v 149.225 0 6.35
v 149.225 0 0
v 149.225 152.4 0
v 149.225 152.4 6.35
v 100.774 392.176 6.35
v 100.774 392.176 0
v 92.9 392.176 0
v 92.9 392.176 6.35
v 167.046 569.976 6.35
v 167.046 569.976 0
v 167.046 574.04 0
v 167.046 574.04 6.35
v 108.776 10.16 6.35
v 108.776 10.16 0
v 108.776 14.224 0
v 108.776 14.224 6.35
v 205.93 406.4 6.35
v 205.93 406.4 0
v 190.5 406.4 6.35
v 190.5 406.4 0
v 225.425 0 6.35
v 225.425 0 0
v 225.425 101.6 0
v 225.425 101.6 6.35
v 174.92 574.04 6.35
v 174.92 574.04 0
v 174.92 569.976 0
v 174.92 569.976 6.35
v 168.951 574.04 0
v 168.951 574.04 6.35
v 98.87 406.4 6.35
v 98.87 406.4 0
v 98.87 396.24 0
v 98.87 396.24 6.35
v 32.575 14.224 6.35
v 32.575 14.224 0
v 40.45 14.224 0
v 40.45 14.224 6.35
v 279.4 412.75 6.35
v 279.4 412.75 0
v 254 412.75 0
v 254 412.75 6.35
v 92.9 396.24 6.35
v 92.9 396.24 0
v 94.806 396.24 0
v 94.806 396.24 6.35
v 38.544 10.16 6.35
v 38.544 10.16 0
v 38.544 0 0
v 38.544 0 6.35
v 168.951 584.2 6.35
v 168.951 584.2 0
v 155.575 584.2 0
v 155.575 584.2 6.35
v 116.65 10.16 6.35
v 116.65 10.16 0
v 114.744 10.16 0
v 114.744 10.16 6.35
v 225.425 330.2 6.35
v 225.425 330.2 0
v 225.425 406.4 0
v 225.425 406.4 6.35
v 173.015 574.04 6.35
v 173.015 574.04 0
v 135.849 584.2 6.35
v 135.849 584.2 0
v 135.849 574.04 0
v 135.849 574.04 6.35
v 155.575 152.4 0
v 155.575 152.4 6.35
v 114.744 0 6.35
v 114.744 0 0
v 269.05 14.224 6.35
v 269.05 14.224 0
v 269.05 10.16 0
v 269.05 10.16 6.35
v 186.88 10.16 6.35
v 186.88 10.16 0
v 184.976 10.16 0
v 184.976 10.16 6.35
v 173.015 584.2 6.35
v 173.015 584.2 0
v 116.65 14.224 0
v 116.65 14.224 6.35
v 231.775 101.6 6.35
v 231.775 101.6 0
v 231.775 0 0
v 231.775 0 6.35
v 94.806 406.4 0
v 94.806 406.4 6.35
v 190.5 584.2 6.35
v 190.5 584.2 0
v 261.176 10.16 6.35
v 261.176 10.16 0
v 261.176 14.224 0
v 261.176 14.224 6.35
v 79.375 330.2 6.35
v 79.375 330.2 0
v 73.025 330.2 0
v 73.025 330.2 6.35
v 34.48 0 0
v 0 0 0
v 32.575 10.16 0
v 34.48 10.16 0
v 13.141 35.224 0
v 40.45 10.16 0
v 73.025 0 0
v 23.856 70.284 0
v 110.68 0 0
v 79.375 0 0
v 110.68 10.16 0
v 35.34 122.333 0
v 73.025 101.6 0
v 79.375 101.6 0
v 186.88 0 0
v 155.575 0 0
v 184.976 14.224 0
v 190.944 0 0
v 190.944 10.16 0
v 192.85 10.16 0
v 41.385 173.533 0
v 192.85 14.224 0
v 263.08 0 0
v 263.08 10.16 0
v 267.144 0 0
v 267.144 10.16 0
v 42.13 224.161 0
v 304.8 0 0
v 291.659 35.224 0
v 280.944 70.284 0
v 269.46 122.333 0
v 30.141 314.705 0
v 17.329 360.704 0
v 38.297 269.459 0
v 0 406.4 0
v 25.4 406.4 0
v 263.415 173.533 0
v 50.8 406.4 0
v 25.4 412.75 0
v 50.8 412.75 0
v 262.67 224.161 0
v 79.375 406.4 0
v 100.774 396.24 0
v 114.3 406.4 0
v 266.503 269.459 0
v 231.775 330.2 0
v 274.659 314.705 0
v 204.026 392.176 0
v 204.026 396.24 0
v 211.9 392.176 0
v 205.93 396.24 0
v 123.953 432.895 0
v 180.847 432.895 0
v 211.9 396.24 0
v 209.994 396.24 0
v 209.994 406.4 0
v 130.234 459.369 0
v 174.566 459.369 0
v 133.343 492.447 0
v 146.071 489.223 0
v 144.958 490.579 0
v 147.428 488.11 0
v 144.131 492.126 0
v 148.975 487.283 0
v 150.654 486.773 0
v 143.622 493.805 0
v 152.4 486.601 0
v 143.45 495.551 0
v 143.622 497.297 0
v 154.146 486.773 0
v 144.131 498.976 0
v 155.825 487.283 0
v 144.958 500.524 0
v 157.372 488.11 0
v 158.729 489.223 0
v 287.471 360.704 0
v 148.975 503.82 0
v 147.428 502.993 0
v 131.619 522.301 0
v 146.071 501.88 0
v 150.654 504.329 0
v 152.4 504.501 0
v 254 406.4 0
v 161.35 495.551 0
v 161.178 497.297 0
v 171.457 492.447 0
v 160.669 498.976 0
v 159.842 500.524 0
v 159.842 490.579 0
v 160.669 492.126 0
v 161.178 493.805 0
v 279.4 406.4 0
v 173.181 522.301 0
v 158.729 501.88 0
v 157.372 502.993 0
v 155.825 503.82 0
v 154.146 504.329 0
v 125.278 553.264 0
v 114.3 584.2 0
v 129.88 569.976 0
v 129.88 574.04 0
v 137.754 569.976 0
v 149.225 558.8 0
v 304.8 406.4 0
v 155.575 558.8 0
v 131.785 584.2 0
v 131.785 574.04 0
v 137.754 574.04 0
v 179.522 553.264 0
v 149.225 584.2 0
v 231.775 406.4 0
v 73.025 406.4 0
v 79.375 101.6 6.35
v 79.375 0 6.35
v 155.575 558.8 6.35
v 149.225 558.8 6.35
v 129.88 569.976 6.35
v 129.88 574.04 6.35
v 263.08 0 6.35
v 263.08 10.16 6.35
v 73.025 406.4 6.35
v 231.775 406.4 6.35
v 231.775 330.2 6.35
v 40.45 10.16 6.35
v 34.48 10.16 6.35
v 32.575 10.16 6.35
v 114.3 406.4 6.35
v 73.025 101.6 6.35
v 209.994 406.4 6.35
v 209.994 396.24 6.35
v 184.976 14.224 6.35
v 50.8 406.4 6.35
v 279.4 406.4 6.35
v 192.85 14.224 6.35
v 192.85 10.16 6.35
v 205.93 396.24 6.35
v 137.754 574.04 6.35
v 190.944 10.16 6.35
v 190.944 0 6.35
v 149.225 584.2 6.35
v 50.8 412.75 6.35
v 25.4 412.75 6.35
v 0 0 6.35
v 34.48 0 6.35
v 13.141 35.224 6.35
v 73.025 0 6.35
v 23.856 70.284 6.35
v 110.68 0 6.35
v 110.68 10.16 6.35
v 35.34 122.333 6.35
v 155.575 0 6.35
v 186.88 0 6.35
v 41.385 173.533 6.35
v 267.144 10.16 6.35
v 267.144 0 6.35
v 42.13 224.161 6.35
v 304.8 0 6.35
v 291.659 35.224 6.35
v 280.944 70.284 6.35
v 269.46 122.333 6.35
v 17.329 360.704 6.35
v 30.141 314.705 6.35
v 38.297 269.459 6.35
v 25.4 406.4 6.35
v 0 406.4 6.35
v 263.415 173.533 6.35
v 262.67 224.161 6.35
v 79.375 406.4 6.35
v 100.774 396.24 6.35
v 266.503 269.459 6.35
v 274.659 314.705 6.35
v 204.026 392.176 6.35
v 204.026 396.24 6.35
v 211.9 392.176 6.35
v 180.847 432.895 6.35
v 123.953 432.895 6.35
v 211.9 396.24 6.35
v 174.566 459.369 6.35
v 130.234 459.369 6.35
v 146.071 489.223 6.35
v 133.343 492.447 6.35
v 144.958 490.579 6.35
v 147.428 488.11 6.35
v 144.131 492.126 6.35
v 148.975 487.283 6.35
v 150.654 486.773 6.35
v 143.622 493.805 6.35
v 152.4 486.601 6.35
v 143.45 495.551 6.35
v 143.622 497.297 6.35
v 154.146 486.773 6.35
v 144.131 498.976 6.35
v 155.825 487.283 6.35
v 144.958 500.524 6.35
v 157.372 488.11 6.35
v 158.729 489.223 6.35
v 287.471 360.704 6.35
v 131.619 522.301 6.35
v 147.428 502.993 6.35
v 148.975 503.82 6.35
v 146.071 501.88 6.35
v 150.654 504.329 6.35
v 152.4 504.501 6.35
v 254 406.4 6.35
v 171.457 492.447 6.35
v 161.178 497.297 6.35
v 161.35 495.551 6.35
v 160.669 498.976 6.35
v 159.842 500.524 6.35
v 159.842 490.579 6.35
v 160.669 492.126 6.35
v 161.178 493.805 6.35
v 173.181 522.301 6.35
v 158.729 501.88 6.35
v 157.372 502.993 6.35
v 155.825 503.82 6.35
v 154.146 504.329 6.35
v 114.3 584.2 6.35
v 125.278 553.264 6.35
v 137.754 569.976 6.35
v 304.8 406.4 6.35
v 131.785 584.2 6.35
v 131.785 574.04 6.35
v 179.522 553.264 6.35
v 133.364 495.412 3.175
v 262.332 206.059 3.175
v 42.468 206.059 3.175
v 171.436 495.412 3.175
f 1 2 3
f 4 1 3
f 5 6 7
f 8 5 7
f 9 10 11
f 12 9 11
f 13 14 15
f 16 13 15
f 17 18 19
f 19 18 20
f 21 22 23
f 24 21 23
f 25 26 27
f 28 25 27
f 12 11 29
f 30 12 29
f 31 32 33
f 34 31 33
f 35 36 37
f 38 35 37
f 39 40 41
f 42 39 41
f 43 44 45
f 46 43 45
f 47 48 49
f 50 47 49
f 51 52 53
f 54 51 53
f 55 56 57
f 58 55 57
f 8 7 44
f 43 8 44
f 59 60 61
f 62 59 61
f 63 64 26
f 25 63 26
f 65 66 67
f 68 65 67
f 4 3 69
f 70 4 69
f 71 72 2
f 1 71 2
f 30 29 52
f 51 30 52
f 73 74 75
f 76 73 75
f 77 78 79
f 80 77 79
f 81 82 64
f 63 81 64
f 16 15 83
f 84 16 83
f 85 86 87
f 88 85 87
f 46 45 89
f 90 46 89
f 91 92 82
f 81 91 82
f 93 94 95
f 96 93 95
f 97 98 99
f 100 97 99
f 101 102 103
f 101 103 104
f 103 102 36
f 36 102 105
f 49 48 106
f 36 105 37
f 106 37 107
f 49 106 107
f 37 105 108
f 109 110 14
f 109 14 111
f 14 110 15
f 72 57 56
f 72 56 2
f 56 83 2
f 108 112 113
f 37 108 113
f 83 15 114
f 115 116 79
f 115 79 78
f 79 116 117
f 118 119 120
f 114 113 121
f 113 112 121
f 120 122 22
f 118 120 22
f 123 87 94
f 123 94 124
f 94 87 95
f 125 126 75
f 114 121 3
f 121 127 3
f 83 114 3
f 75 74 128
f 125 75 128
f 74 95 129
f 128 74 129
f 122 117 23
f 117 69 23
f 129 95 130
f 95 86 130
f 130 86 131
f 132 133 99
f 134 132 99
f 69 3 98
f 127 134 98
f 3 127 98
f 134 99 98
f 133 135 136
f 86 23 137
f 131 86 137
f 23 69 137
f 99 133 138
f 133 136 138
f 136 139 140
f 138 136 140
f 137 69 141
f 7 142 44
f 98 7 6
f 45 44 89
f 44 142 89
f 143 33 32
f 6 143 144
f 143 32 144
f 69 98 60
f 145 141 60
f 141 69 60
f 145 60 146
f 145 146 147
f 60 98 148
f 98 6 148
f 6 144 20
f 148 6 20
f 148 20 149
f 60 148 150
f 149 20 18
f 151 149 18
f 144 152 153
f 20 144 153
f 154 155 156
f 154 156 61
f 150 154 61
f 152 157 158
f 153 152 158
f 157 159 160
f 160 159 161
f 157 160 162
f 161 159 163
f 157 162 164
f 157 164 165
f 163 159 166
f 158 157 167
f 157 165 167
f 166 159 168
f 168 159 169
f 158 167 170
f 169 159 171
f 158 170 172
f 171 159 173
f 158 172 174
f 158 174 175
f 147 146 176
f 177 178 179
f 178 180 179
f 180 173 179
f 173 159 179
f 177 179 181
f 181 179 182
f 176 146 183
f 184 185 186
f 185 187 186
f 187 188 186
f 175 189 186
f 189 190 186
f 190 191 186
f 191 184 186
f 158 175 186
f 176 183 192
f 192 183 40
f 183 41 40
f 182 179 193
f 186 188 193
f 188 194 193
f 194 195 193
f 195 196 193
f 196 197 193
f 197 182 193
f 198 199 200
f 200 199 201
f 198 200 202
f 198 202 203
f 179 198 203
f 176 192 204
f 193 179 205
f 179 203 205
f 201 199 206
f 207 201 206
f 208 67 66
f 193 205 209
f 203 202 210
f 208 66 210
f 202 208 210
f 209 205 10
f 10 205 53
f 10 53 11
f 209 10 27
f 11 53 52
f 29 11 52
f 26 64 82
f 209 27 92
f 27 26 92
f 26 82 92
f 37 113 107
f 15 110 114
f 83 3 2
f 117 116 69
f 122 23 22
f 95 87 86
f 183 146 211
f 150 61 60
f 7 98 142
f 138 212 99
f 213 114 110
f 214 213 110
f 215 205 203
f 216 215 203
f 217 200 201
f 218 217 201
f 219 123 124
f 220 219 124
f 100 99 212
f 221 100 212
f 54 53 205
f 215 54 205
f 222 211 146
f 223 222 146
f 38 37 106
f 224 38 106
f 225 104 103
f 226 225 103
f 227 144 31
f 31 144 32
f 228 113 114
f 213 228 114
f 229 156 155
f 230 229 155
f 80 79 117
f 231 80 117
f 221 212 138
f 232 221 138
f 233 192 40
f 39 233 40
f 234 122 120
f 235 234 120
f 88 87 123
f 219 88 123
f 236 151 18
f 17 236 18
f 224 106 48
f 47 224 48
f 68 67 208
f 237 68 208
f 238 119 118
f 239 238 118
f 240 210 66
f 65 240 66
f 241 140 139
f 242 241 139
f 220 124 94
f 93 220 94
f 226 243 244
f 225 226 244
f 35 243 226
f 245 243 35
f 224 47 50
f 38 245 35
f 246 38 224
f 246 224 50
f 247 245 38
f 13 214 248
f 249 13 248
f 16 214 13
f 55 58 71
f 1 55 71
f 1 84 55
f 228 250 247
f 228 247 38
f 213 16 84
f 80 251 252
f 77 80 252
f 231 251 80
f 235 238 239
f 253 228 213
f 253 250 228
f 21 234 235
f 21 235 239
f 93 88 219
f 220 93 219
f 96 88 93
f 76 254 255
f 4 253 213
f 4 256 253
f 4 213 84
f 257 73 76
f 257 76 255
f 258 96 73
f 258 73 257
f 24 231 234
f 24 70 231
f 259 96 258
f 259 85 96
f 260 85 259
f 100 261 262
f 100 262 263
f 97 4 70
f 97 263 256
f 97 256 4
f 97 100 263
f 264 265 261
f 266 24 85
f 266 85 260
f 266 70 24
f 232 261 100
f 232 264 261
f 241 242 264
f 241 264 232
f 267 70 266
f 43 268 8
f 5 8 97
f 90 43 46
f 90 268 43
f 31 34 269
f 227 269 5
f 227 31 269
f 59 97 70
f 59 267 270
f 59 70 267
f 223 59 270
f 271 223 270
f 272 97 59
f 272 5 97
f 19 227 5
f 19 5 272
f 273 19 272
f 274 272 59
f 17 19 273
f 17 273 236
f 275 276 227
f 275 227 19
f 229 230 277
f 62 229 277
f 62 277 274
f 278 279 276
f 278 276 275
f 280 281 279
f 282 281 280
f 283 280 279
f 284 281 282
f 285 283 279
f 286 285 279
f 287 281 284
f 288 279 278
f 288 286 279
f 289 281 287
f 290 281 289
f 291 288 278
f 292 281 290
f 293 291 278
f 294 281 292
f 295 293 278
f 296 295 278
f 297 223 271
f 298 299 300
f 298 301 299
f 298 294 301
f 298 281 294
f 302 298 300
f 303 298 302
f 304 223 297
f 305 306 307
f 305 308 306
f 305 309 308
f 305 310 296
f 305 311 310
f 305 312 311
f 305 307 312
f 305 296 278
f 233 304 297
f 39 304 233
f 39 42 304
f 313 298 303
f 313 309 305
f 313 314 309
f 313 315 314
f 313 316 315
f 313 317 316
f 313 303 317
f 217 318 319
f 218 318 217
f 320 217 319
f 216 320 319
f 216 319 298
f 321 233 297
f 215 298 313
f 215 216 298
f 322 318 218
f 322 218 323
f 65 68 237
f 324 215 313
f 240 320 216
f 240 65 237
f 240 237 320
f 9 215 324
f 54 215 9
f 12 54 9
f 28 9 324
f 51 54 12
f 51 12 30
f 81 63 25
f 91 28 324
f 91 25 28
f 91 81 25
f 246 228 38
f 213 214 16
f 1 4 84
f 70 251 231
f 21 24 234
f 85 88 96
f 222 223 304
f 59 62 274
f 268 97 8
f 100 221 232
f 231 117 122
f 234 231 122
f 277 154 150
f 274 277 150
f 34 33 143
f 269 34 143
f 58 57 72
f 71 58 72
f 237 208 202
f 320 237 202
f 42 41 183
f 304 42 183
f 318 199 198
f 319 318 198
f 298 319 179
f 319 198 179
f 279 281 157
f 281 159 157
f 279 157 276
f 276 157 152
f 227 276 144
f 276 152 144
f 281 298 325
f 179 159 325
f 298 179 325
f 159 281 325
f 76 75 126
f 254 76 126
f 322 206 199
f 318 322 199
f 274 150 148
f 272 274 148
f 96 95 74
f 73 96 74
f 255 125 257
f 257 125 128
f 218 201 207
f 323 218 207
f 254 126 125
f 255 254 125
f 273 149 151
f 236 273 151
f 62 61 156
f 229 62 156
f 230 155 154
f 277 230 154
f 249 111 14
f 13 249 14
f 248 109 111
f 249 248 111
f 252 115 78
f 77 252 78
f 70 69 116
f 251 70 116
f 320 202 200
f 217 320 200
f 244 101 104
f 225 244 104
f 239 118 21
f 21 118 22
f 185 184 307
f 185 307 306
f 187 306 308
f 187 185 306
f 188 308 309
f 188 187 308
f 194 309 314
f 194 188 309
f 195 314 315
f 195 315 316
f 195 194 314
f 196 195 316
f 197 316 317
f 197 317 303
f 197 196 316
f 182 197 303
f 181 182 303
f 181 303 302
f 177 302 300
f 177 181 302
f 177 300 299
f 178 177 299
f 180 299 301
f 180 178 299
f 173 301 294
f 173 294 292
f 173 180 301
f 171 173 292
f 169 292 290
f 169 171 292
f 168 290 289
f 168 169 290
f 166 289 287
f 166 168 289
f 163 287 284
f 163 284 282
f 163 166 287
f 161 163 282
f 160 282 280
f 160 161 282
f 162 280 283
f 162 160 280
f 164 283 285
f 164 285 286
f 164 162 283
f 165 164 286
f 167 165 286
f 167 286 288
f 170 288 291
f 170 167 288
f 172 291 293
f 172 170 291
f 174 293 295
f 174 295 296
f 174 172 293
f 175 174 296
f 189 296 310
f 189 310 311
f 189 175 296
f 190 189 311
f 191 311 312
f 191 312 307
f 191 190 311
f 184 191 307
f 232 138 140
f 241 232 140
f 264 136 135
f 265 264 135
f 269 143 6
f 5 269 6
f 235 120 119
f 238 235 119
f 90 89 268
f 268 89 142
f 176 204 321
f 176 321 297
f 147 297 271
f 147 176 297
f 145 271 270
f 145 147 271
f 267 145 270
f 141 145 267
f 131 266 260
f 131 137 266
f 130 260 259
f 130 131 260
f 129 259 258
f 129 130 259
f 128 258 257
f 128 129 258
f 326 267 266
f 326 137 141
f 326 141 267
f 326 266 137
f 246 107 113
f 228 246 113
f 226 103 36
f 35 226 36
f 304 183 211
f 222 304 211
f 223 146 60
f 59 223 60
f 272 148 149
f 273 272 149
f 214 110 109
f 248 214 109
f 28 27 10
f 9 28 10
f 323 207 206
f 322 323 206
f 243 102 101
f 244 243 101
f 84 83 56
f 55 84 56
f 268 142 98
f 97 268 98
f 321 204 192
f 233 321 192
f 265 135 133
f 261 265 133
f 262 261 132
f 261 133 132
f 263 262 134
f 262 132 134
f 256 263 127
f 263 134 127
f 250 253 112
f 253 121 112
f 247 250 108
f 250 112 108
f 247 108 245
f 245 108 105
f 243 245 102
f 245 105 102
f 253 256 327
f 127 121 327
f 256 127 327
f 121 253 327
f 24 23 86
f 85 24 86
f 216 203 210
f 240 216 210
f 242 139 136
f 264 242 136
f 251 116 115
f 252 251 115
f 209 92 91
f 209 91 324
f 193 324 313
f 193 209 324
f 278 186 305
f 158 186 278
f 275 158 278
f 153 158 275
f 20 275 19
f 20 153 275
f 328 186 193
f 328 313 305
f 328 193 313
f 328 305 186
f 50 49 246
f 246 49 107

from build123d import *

# Parameters (mm, degrees)
SKETCH1_R           = 8.95
BOSS_EXTRUDE1_DEPTH = 6.35


with BuildPart() as part:
    # Sketch1 → Boss-Extrude1 (new body)
    with BuildSketch(Plane.XY):
        with BuildLine():
            Line((0, 0), (34.4805, 0))
            Line((34.4805, 0), (34.4805, 10.16))
            Line((34.4805, 10.16), (32.5755, 10.16))
            Line((32.5755, 10.16), (32.5755, 14.224))
            Line((32.5755, 14.224), (40.4495, 14.224))
            Line((40.4495, 14.224), (40.4495, 10.16))
            Line((40.4495, 10.16), (38.5445, 10.16))
            Line((38.5445, 10.16), (38.5445, 0))
            Line((38.5445, 0), (73.025, 0))
            Line((73.025, 0), (73.025, 101.6))
            Line((73.025, 101.6), (79.375, 101.6))
            Line((79.375, 101.6), (79.375, 0))
            Line((79.375, 0), (110.6805, 0))
            Line((110.6805, 0), (110.6805, 10.16))
            Line((110.6805, 10.16), (108.7755, 10.16))
            Line((108.7755, 10.16), (108.7755, 14.224))
            Line((108.7755, 14.224), (116.6495, 14.224))
            Line((116.6495, 14.224), (116.6495, 10.16))
            Line((116.6495, 10.16), (114.7445, 10.16))
            Line((114.7445, 10.16), (114.7445, 0))
            Line((114.7445, 0), (149.225, 0))
            Line((149.225, 0), (149.225, 152.4))
            Line((149.225, 152.4), (155.575, 152.4))
            Line((155.575, 152.4), (155.575, 0))
            Line((155.575, 0), (186.8805, 0))
            Line((186.8805, 0), (186.8805, 10.16))
            Line((186.8805, 10.16), (184.9755, 10.16))
            Line((184.9755, 10.16), (184.9755, 14.224))
            Line((184.9755, 14.224), (192.8495, 14.224))
            Line((192.8495, 14.224), (192.8495, 10.16))
            Line((192.8495, 10.16), (190.9445, 10.16))
            Line((190.9445, 10.16), (190.9445, 0))
            Line((190.9445, 0), (225.425, 0))
            Line((225.425, 0), (225.425, 101.6))
            Line((225.425, 101.6), (231.775, 101.6))
            Line((231.775, 101.6), (231.775, 0))
            Line((231.775, 0), (263.0805, 0))
            Line((263.0805, 0), (263.0805, 10.16))
            Line((263.0805, 10.16), (261.1755, 10.16))
            Line((261.1755, 10.16), (261.1755, 14.224))
            Line((261.1755, 14.224), (269.0495, 14.224))
            Line((269.0495, 14.224), (269.0495, 10.16))
            Line((269.0495, 10.16), (267.1445, 10.16))
            Line((267.1445, 10.16), (267.1445, 0))
            Line((267.1445, 0), (304.8, 0))
            add(Edge.make_bspline(
                [(304.8, 406.4), (219.863978117, 208.91880682), (304.8, 0)],
                knots=[0, 0, 0, 1, 1, 1], degree=2))
            Line((304.8, 406.4), (279.4, 406.4))
            Line((279.4, 406.4), (279.4, 412.75))
            Line((279.4, 412.75), (254, 412.75))
            Line((254, 412.75), (254, 406.4))
            Line((254, 406.4), (231.775, 406.4))
            Line((231.775, 406.4), (231.775, 330.2))
            Line((231.775, 330.2), (225.425, 330.2))
            Line((225.425, 330.2), (225.425, 406.4))
            Line((225.425, 406.4), (209.9945, 406.4))
            Line((209.9945, 406.4), (209.9945, 396.24))
            Line((209.9945, 396.24), (211.8995, 396.24))
            Line((211.8995, 396.24), (211.8995, 392.176))
            Line((211.8995, 392.176), (204.0255, 392.176))
            Line((204.0255, 392.176), (204.0255, 396.24))
            Line((204.0255, 396.24), (205.9305, 396.24))
            Line((205.9305, 396.24), (205.9305, 406.4))
            Line((205.9305, 406.4), (190.5, 406.4))
            add(Edge.make_bspline(
                [(190.5, 584.2), (152.371549644, 495.523357598), (190.5, 406.4)],
                knots=[0, 0, 0, 1, 1, 1], degree=2))
            Line((190.5, 584.2), (173.014669528, 584.2))
            Line((173.014669528, 584.2), (173.014669528, 574.04))
            Line((173.014669528, 574.04), (174.919669528, 574.04))
            Line((174.919669528, 574.04), (174.919669528, 569.976))
            Line((174.919669528, 569.976), (167.045669528, 569.976))
            Line((167.045669528, 569.976), (167.045669528, 574.04))
            Line((167.045669528, 574.04), (168.950669528, 574.04))
            Line((168.950669528, 574.04), (168.950669528, 584.2))
            Line((168.950669528, 584.2), (155.575, 584.2))
            Line((155.575, 584.2), (155.575, 558.8))
            Line((155.575, 558.8), (149.225, 558.8))
            Line((149.225, 558.8), (149.225, 584.2))
            Line((149.225, 584.2), (135.849330472, 584.2))
            Line((135.849330472, 584.2), (135.849330472, 574.04))
            Line((135.849330472, 574.04), (137.754330472, 574.04))
            Line((137.754330472, 574.04), (137.754330472, 569.976))
            Line((137.754330472, 569.976), (129.880330472, 569.976))
            Line((129.880330472, 569.976), (129.880330472, 574.04))
            Line((129.880330472, 574.04), (131.785330472, 574.04))
            Line((131.785330472, 574.04), (131.785330472, 584.2))
            Line((131.785330472, 584.2), (114.3, 584.2))
            add(Edge.make_bspline(
                [(114.3, 584.2), (152.428450356, 495.523357598), (114.3, 406.4)],
                knots=[0, 0, 0, 1, 1, 1], degree=2))
            Line((114.3, 406.4), (98.8695, 406.4))
            Line((98.8695, 406.4), (98.8695, 396.24))
            Line((98.8695, 396.24), (100.7745, 396.24))
            Line((100.7745, 396.24), (100.7745, 392.176))
            Line((100.7745, 392.176), (92.9005, 392.176))
            Line((92.9005, 392.176), (92.9005, 396.24))
            Line((92.9005, 396.24), (94.8055, 396.24))
            Line((94.8055, 396.24), (94.8055, 406.4))
            Line((94.8055, 406.4), (79.375, 406.4))
            Line((79.375, 406.4), (79.375, 330.2))
            Line((79.375, 330.2), (73.025, 330.2))
            Line((73.025, 330.2), (73.025, 406.4))
            Line((73.025, 406.4), (50.8, 406.4))
            Line((50.8, 406.4), (50.8, 412.75))
            Line((50.8, 412.75), (25.4, 412.75))
            Line((25.4, 412.75), (25.4, 406.4))
            Line((25.4, 406.4), (0, 406.4))
            add(Edge.make_bspline(
                [(0, 406.4), (84.936021883, 208.91880682), (0, 0)],
                knots=[0, 0, 0, 1, 1, 1], degree=2))
        make_face()
        with Locations((152.4, 495.55130888)):
            Circle(SKETCH1_R, mode=Mode.SUBTRACT)
    extrude(amount=BOSS_EXTRUDE1_DEPTH)


solid = part.part
